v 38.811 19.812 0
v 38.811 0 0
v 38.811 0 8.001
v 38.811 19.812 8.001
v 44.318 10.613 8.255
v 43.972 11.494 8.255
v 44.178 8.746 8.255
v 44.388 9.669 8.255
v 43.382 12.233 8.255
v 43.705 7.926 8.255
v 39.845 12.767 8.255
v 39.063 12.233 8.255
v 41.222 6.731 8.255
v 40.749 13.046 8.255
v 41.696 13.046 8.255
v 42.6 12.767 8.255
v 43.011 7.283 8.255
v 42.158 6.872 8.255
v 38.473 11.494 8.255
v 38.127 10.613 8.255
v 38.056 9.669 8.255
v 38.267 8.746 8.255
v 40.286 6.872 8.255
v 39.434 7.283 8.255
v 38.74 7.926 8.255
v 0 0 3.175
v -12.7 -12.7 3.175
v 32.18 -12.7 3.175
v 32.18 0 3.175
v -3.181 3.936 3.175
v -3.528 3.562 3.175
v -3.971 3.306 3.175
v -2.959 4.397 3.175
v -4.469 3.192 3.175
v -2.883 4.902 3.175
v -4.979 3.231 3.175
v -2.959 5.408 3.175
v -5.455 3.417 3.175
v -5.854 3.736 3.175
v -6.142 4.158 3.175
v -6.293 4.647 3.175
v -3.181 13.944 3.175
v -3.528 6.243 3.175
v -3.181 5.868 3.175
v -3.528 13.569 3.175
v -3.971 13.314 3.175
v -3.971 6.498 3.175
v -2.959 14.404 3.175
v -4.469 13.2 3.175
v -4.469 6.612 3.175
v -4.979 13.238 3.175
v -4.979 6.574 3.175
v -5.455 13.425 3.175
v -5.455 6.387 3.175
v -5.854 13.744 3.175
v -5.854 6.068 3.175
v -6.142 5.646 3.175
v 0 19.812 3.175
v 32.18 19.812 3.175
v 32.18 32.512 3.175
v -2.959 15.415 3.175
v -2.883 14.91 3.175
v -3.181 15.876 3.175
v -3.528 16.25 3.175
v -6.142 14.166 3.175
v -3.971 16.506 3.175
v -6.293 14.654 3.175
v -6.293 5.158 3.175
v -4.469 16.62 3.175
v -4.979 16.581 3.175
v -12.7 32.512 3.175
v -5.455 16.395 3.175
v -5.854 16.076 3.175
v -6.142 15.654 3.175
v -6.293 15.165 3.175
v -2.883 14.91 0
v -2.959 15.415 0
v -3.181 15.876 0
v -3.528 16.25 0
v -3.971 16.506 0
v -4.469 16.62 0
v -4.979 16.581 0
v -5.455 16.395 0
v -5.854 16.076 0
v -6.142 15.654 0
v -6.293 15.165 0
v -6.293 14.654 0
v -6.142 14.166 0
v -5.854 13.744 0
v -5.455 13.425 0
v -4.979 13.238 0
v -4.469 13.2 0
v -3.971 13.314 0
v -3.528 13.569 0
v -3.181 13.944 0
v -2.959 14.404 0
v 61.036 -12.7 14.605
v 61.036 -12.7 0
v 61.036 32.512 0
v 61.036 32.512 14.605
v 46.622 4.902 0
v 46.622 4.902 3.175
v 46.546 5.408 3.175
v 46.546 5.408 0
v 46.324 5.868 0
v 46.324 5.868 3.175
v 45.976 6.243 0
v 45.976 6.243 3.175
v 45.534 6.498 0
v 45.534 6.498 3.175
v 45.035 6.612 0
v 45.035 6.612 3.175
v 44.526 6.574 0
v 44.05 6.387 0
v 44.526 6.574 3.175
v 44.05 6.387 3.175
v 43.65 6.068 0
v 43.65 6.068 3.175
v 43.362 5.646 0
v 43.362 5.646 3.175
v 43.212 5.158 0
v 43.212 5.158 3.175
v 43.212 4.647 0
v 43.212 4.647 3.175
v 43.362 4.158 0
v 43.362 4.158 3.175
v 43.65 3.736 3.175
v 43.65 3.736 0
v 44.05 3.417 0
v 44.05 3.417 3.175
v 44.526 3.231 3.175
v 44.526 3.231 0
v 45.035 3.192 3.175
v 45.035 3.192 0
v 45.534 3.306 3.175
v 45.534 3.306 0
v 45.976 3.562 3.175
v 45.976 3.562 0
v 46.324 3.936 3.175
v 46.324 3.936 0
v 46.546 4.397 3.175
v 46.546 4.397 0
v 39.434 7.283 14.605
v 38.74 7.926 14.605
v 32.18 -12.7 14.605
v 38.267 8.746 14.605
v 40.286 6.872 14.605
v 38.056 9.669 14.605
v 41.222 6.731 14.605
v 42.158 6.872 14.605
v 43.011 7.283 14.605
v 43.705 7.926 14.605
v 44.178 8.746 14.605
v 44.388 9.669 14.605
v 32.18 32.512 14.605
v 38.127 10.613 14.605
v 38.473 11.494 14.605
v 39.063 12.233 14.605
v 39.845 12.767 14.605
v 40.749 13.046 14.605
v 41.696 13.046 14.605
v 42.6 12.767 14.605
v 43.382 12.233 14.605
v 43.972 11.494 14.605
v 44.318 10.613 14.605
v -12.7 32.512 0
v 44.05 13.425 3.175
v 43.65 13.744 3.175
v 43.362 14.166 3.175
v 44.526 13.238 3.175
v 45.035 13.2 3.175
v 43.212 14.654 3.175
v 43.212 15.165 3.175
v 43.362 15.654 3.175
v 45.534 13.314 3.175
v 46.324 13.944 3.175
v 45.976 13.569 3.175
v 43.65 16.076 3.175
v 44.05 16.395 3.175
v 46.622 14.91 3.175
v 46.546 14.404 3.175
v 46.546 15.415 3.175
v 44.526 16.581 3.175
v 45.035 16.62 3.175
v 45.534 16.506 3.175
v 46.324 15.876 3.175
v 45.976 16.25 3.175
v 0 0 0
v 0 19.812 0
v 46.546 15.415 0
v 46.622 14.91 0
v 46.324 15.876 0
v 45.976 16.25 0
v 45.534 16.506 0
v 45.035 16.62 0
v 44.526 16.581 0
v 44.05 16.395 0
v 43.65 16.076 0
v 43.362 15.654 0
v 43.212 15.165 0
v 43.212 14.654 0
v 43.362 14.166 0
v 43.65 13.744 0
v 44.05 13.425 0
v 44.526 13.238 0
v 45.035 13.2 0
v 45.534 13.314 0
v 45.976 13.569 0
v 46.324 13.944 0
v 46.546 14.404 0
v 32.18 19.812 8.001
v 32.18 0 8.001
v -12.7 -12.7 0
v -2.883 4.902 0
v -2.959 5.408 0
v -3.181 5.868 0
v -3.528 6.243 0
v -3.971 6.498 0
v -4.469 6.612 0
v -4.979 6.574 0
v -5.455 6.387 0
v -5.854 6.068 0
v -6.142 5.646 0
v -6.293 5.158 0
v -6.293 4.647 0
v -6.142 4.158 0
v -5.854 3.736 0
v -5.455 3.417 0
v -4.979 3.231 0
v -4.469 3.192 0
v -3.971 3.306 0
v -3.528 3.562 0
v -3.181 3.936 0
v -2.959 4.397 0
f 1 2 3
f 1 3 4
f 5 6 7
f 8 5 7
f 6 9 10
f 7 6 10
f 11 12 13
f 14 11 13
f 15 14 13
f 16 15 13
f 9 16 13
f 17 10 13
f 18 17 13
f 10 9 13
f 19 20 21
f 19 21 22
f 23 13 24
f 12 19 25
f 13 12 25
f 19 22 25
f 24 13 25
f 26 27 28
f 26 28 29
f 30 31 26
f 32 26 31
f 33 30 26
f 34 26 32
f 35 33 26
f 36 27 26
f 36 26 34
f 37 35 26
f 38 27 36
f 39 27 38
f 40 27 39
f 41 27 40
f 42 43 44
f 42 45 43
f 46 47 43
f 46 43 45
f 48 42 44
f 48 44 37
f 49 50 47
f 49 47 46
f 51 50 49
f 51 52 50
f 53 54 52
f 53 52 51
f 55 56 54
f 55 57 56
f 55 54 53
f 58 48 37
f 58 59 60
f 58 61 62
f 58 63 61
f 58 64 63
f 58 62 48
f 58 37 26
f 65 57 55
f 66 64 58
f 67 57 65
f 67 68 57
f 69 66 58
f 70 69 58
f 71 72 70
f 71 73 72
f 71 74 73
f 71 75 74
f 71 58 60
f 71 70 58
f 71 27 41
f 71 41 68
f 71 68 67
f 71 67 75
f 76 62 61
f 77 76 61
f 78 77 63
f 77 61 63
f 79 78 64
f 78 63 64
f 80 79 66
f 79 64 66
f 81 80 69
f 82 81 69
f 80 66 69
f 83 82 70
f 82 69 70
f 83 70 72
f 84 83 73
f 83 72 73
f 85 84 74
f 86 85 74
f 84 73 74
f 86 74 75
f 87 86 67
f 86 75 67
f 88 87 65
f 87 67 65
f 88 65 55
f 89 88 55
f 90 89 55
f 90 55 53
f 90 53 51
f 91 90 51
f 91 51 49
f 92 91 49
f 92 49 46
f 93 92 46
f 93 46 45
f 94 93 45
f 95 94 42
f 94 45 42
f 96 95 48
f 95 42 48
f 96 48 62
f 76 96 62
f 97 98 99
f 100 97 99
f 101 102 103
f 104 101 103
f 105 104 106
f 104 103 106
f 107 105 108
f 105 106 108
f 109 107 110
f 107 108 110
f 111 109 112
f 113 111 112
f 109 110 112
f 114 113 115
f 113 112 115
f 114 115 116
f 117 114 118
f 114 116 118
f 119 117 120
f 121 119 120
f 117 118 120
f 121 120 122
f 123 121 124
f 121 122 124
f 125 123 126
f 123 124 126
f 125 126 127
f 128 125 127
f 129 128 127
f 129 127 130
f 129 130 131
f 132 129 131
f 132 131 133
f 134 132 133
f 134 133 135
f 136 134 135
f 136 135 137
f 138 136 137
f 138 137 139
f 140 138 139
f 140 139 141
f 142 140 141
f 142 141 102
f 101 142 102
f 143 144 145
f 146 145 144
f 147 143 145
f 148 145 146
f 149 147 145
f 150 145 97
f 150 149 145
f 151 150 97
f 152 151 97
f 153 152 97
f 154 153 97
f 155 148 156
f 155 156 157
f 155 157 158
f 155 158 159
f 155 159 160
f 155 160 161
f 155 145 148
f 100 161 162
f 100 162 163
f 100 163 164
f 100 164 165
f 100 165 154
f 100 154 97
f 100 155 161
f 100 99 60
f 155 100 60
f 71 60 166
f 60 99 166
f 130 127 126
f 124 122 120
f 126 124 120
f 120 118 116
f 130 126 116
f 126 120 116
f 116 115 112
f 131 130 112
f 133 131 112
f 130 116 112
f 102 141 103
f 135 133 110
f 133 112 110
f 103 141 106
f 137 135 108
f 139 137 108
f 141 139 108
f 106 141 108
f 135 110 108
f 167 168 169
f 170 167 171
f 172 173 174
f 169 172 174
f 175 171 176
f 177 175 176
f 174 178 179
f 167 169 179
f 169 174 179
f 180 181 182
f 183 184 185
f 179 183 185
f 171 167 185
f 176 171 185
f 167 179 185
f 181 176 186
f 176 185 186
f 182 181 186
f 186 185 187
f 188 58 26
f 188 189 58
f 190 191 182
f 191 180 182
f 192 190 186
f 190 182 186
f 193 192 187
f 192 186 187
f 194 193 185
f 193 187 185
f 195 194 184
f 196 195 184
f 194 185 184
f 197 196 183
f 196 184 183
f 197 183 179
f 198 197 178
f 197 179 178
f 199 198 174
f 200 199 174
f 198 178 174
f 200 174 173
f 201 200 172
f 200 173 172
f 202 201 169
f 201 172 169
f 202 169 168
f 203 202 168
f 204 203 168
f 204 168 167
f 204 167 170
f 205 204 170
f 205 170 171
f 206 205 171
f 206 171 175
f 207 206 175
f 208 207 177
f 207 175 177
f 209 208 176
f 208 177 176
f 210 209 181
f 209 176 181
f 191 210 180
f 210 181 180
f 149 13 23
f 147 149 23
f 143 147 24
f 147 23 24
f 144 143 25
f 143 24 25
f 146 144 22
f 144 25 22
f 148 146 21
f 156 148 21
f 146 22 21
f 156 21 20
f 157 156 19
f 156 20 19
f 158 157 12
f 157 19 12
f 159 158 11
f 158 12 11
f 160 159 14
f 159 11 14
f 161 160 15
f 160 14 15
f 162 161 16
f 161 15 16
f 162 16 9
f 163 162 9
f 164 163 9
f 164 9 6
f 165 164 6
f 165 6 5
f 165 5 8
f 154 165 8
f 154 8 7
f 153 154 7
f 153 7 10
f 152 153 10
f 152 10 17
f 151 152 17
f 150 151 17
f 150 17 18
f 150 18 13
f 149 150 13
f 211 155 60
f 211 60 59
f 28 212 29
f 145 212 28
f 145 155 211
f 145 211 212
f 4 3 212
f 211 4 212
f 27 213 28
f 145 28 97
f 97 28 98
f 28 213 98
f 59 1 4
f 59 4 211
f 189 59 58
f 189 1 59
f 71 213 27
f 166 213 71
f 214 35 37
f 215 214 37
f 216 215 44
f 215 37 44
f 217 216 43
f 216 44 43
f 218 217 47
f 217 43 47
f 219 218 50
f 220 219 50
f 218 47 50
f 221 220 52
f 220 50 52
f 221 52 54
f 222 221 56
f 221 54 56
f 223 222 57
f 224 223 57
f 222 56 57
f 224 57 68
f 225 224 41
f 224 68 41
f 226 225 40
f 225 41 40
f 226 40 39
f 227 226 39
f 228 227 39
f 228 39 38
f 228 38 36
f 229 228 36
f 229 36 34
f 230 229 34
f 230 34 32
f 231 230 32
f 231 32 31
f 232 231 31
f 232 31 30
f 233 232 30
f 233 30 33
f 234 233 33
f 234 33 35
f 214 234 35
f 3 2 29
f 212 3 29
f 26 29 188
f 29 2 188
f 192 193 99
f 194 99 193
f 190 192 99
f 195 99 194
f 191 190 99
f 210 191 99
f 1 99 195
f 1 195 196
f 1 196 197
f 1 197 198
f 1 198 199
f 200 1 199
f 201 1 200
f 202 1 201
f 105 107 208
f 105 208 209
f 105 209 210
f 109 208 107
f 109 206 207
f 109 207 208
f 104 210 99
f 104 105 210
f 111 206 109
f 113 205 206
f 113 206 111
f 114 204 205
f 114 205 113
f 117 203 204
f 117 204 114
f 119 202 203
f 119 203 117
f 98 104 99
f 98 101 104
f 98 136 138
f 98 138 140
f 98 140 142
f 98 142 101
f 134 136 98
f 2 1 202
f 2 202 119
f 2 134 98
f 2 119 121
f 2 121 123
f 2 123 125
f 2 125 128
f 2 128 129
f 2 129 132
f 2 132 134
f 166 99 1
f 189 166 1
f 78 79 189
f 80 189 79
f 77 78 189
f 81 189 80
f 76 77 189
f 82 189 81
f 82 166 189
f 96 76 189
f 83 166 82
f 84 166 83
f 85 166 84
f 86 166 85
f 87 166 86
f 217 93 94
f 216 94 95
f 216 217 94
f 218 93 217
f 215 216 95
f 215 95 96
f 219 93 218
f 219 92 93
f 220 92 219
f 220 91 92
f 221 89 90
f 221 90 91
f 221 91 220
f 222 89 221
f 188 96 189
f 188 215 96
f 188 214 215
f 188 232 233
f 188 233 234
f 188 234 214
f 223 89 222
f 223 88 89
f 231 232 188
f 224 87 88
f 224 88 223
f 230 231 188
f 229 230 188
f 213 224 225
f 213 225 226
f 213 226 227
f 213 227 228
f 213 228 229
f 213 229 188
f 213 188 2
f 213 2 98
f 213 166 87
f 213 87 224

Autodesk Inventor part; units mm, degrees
ref_plane "YZ Plane" through (0, 0, 0) normal (1, 0, 0) x (0, 1, 0)
ref_plane "XZ Plane" through (0, 0, 0) normal (0, 1, 0) x (-1, 0, 0)
ref_plane "XY Plane" through (0, 0, 0) normal (0, 0, 1) x (1, 0, 0)
sketch "Sketch1" plane through (0, 0, 0) normal (0, 0, 1) x (1, 0, 0)
  line L0 (0, 0) -> (38.8112, 0)
  line L1 (38.8112, 0) -> (38.8112, 19.812)
  line L2 (38.8112, 19.812) -> (0, 19.812)
  line L3 (0, 19.812) -> (0, 0)
  line L4 (-12.7, -12.7) -> (-12.7, 32.512)
  line L5 (-12.7, 32.512) -> (57.8612, 32.512)
  line L6 (57.8612, 32.512) -> (57.8612, -12.7)
  line L7 (-12.7, -12.7) -> (57.8612, -12.7)
  dimension "d0" = 38.8112
  dimension "d1" = 19.812
  dimension "d56" = 12.7
  dimension "d57" = 19.05
extrude "Extrusion1" add sketch "Sketch1" along normal blind 3.175
sketch "Sketch2" plane through (0, 0, 3.175) normal (0, 0, 1) x (1, 0, 0)
  line L0 (0, 19.812) -> (0, 0) projected
  circle A0 centre (-4.5974, 4.9022) radius 1.0541
  line L1 (38.8112, 19.812) -> (38.8112, 0) projected
  circle A1 centre (44.9072, 4.9022) radius 1.0541
  circle A2 centre (44.9072, 14.9098) radius 1.0541
  circle A3 centre (-4.5974, 14.9098) radius 1.0541
  circle A4 centre (-4.5974, 4.9022) radius 1.7145
  circle A5 centre (-4.5974, 14.9098) radius 1.7145
  circle A6 centre (44.9072, 14.9098) radius 1.7145
  circle A7 centre (44.9072, 4.9022) radius 1.7145
  dimension "d10" = 2.1082
  dimension "d15" = 3.429
  dimension "d16" = 3.429
  dimension "d17" = 3.429
  dimension "d18" = 3.429
  dimension "d46" = 49.5046
  dimension "d47" = 49.5046
extrude "Extrusion2" cut sketch "Sketch2" against normal blind 3.175 contours A0 | A1 | A2 | A3 | A4 | A5 | A6 | A7
sketch "Sketch3" plane through (57.8612, -12.7, 0) normal (1, 0, 0) x (0, 0, -1)
  line L0 (0, 0) -> (-3.175, 0) projected
  line L1 (-3.175, 0) -> (-3.175, 45.212) projected
  line L2 (0, 0) -> (-3.175, 0)
  line L3 (-3.175, 0) -> (-3.175, 45.212)
  line L4 (-3.175, 45.212) -> (0, 45.212)
  line L5 (0, 45.212) -> (0, 0)
  point P0 (0, 12.7)
extrude "Extrusion3" add sketch "Sketch3" along normal blind 3.175
sketch "Sketch4" plane through (0, 0, 3.175) normal (0, 0, 1) x (1, 0, 0)
  line L0 (61.0362, 32.512) -> (61.0362, -12.7) projected
  line L1 (61.0362, 32.512) -> (57.8612, 32.512)
  line L2 (-12.7, 32.512) -> (61.0362, 32.512) projected
  line L3 (57.8612, 32.512) -> (51.2299, -12.7)
  line L4 (-12.7, -12.7) -> (61.0362, -12.7) projected
  line L5 (61.0362, -12.7) -> (51.2299, -12.7)
  point P0 (0, 0)
  dimension "d21" = 3.175
extrude "Extrusion4" add sketch "Sketch4" along normal blind 8.2296
sketch "Sketch8" plane through (0, 0, 3.175) normal (0, 0, 1) x (1, 0, 0)
  line L0 (51.2299, -12.7) -> (32.1799, -12.7)
  line L1 (-12.7, -12.7) -> (51.2299, -12.7) projected
  line L2 (38.8112, 0) -> (0, 0) projected
  line L3 (32.1799, -12.7) -> (32.1799, 32.512)
  line L4 (-12.7, 32.512) -> (57.8612, 32.512) projected
  line L5 (32.1799, 32.512) -> (57.8612, 32.512)
  line L6 (51.2299, -12.7) -> (57.8612, 32.512) projected
  line L7 (57.8612, 32.512) -> (51.2299, -12.7)
  dimension "d33" = 19.05
  dimension "d36" = 45.212
extrude "Extrusion7" add sketch "Sketch8" along normal blind 8.2296
sketch "Sketch9" plane through (0, 0, 11.4046) normal (0, 0, 1) x (1, 0, 0)
  line L0 (61.0362, -12.7) -> (61.0362, 32.512) projected
  line L1 (61.0362, 8.6893) -> (74.4982, 8.6893) construction
  line L2 (-12.7, 32.512) -> (61.0362, 32.512) projected
  line L3 (41.2242, 32.512) -> (63.8302, 32.512) construction
  circle A0 centre (41.2242, 9.906) radius 3.175
  point P0 (0, 0)
  dimension "d41" = 6.35
sketch "Sketch10" plane through (0, 0, 3.175) normal (0, 0, -1) x (-1, 0, 0)
  line L0 (-38.8112, 0) -> (-38.8112, 19.812) projected
  line L1 (-38.8112, 19.812) -> (-38.8112, 0)
  line L2 (-38.8112, 0) -> (-32.1799, 0)
  line L3 (-32.1799, 32.512) -> (-32.1799, -12.7) projected
  line L4 (-32.1799, 19.812) -> (-32.1799, 0)
  line L5 (-38.8112, 19.812) -> (0, 19.812) projected
  line L6 (-38.8112, 19.812) -> (-32.1799, 19.812)
  point P0 (0, 0)
extrude "Extrusion9" cut sketch "Sketch10" against normal blind 5.08
thread "Thread1" size "6-32 UNC" class "2B" standard "ANSI Unified Screw Threads" full length
thread "Thread2" size "6-32 UNC" class "2B" standard "ANSI Unified Screw Threads" full length
thread "Thread3" size "6-32 UNC" class "2B" standard "ANSI Unified Screw Threads" full length
thread "Thread4" size "6-32 UNC" class "2B" standard "ANSI Unified Screw Threads" full length
sketch "Sketch11" plane through (0, 0, 11.4046) normal (0, 0, 1) x (1, 0, 0)
  line L0 (32.1799, 32.512) -> (32.1799, -12.7) projected
  line L1 (32.1799, -12.7) -> (61.0362, -12.7)
  line L2 (61.0362, -12.7) -> (61.0362, 32.512)
  line L3 (61.0362, 32.512) -> (32.1799, 32.512)
  line L4 (32.1799, 32.512) -> (32.1799, -12.7)
  point P0 (0, 0)
extrude "Extrusion10" add sketch "Sketch11" along normal blind 3.2004
sketch "Sketch12" plane through (0, 0, 14.605) normal (0, 0, 1) x (1, 0, 0)
  point P0 (0, 0)
sketch "Sketch13" plane through (0, 0, 14.605) normal (0, 0, 1) x (1, 0, 0)
  line L0 (32.1799, 32.512) -> (32.1799, -12.7) projected
  line L1 (32.1799, 9.906) -> (41.2223, 9.906)
  line L2 (32.1799, -12.7) -> (61.0362, -12.7) projected
  line L3 (41.2223, -12.7) -> (41.2223, 9.906)
  circle A0 centre (41.2223, 9.906) radius 3.175
  point P0 (0, 0)
  dimension "d60" = 9.0424
  dimension "d61" = 22.606
  dimension "d62" = 6.35
hole "Hole1" at (41.2223, 9.906, 14.605) direction (0, 0, -1) diameter 6.35 depth 6.35
sketch "Sketch14" plane through (0, 0, 8.255) normal (0, 0, -1) x (-1, 0, 0)
  line L0 (-32.1799, 0) -> (-38.8112, 0) projected
  line L1 (-32.1799, 0) -> (-38.8112, 0)
  line L2 (-38.8112, 0) -> (-38.8112, 19.812)
  line L3 (-38.8112, 19.812) -> (-32.1799, 19.812)
  line L4 (-32.1799, 19.812) -> (-32.1799, 0)
  point P0 (0, 0)
extrude "Extrusion11" add sketch "Sketch14" along normal blind 0.254
thread "Thread5" size "1/4-20 UNC" class "2B" standard "ANSI Unified Screw Threads" full length
properties part number "ClawServoHolder"
